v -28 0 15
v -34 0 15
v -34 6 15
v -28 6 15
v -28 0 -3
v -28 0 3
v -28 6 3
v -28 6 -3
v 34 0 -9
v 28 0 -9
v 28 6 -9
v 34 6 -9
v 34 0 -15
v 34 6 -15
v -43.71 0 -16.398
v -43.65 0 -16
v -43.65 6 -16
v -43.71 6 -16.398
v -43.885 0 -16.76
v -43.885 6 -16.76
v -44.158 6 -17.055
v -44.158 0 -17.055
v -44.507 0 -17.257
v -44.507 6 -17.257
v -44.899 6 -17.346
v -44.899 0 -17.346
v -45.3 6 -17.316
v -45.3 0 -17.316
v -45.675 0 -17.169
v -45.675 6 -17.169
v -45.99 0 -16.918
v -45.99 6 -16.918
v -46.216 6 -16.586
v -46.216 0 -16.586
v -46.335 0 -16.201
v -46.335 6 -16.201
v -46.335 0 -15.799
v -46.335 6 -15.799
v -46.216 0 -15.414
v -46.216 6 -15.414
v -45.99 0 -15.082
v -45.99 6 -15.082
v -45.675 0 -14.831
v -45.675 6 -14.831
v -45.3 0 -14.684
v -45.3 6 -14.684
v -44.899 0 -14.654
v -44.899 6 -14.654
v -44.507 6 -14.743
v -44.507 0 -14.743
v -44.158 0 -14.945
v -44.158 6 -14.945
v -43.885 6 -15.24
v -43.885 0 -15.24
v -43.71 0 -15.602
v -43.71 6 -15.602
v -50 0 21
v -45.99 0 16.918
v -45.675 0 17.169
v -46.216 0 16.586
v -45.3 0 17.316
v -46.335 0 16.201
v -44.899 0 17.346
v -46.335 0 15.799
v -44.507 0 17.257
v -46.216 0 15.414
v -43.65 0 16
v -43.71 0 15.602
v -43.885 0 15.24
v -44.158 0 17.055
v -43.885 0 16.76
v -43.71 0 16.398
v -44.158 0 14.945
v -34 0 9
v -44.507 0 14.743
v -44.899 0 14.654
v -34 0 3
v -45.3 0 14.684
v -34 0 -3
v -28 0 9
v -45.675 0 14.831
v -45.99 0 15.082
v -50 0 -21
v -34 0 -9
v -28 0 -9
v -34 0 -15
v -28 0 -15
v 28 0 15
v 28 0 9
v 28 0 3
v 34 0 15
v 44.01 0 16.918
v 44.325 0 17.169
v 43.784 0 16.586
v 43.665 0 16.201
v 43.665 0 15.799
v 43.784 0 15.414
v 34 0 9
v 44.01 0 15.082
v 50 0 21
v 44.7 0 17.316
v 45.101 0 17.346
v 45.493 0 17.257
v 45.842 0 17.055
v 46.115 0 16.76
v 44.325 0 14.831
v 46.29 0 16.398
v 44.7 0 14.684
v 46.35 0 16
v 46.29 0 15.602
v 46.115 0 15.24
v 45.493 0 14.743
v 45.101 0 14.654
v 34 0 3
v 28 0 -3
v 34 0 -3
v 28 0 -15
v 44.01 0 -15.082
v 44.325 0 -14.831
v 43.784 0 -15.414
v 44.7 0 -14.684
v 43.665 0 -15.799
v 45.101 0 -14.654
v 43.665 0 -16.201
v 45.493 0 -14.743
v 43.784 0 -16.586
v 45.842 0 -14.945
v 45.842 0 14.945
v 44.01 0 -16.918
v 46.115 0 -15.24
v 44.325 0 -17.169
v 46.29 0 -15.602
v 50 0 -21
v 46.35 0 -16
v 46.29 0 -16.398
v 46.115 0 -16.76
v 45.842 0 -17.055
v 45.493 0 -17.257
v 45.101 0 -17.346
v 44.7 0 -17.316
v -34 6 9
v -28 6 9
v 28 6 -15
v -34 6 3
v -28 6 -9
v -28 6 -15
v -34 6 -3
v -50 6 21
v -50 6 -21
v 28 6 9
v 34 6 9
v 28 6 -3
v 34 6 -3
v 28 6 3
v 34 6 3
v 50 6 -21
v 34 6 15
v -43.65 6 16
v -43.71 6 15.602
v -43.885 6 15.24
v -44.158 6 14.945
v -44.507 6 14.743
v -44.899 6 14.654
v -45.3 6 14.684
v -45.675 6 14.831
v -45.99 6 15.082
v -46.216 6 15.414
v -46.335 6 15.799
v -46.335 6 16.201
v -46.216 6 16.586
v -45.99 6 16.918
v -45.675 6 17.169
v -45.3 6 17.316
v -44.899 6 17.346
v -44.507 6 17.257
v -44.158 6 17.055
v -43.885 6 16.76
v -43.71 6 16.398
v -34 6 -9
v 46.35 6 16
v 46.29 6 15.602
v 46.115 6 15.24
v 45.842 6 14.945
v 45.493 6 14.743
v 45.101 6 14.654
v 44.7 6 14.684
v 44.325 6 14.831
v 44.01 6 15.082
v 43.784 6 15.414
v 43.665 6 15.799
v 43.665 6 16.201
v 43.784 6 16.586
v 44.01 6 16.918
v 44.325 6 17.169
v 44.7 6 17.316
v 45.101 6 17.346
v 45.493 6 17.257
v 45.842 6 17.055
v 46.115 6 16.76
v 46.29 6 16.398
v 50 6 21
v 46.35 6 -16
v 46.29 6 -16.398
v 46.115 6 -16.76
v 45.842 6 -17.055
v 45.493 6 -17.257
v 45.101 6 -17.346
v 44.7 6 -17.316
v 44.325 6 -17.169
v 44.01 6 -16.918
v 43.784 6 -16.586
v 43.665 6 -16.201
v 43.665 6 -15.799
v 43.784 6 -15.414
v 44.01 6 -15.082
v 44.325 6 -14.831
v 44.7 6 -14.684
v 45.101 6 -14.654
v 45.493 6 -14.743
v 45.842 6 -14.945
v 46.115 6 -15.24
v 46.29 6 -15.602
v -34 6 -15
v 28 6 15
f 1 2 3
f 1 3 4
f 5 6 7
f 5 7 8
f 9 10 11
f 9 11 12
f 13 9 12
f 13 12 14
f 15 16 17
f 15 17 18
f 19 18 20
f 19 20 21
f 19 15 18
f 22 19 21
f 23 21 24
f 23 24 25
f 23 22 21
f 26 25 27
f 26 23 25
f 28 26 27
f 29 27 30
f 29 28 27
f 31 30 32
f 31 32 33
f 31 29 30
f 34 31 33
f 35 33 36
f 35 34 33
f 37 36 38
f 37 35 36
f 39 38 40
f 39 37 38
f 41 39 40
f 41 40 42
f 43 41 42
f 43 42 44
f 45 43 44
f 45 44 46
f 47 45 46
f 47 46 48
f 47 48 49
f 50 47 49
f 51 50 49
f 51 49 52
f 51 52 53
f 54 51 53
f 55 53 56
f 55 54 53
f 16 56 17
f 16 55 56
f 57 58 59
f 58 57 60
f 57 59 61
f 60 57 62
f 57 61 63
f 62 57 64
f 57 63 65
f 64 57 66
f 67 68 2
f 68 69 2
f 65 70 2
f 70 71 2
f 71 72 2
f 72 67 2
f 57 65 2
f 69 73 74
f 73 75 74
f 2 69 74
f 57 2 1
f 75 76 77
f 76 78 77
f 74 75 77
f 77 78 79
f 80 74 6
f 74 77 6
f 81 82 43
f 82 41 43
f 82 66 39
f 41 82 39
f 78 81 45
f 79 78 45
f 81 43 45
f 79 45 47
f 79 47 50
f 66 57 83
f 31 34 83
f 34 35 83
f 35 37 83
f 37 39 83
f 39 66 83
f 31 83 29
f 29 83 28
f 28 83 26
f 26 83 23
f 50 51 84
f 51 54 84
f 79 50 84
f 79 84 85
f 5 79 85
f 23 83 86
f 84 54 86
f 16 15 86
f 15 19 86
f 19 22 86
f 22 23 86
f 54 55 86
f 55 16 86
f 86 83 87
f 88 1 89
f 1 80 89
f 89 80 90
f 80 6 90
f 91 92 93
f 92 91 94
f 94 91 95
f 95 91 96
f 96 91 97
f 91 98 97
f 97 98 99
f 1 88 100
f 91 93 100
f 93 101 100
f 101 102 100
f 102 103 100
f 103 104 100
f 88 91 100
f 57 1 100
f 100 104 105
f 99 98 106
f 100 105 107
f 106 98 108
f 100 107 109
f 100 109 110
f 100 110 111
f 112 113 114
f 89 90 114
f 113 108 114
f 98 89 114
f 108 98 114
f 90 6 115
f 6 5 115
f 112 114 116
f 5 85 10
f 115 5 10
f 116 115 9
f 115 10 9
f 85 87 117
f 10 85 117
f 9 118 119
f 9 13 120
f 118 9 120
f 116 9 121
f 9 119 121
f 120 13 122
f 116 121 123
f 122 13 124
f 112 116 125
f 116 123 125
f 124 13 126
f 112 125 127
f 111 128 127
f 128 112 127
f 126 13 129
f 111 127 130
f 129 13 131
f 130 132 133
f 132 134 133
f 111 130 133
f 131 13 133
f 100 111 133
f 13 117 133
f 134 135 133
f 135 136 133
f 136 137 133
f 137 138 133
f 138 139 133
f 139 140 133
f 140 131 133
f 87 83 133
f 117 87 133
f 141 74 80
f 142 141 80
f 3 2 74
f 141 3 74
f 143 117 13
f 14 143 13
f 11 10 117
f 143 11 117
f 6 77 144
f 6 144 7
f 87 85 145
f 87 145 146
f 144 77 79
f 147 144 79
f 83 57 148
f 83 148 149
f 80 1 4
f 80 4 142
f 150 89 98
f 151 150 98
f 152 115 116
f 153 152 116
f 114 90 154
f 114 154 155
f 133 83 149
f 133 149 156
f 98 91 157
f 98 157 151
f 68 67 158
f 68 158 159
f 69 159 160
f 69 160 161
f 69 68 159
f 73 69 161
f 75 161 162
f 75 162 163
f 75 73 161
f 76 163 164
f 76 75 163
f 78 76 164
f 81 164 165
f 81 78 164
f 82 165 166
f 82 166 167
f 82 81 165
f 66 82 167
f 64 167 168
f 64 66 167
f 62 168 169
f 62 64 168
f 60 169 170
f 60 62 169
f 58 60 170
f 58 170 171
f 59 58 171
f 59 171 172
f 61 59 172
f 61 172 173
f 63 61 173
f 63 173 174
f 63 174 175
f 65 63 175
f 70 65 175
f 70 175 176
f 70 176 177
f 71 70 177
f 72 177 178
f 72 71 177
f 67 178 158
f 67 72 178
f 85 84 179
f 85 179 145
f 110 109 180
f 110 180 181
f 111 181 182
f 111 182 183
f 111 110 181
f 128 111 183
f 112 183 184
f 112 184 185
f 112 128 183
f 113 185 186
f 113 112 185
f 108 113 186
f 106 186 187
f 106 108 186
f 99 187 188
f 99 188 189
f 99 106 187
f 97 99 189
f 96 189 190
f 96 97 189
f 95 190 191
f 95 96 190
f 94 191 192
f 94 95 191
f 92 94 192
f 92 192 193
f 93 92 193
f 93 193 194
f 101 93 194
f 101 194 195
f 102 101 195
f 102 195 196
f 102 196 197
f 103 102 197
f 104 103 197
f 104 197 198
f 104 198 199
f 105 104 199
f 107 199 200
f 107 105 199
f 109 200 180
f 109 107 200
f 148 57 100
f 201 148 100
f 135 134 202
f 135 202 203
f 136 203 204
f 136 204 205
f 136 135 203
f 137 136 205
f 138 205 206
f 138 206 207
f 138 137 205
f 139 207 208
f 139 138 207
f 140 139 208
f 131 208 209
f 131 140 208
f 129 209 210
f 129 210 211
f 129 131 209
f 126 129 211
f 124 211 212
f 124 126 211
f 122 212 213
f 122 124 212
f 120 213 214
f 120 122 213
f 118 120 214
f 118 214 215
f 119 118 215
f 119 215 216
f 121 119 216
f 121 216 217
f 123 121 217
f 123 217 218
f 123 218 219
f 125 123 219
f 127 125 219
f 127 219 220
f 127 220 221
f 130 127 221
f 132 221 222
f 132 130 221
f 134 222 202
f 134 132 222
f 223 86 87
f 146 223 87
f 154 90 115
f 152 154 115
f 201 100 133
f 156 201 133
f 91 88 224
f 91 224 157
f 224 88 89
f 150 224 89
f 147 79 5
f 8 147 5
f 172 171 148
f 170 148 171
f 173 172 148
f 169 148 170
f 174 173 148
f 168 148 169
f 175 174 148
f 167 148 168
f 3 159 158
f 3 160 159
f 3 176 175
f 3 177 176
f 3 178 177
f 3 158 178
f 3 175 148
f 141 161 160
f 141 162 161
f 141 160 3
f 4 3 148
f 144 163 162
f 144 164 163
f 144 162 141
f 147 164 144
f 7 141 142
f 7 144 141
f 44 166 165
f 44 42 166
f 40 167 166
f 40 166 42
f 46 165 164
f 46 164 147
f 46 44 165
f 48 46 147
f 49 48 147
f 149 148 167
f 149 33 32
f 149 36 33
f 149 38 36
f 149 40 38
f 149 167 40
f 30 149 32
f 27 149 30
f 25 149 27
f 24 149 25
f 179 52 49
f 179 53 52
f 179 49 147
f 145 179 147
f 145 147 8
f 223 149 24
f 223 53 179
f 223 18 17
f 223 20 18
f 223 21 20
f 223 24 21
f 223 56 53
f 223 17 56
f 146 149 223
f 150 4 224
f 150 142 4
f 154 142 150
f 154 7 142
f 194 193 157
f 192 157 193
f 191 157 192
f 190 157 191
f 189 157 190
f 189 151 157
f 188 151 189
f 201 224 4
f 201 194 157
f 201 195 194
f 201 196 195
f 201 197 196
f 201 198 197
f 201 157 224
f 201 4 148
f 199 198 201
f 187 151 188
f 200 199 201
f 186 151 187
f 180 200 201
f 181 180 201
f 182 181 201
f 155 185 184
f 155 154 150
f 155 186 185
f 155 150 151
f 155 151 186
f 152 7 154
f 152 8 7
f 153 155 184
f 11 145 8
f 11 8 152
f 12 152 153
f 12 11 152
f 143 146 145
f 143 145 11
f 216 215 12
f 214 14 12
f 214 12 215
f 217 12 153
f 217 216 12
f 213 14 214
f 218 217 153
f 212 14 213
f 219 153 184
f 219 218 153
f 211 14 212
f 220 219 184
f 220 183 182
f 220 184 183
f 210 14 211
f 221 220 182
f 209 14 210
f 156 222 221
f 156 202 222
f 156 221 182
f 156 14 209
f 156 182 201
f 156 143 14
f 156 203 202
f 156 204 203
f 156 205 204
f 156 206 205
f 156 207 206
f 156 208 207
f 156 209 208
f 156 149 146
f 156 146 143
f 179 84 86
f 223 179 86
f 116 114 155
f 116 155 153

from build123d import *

# Parameters (mm, degrees)
SKETCH2_W           = 100
SKETCH2_H           = 42
SKETCH2_R           = 1.35
SKETCH2_W_2         = 6
SKETCH2_H_2         = 6
BOSS_EXTRUDE1_DEPTH = 6


with BuildPart() as part:
    # Sketch2 → Boss-Extrude1 (new body)
    with BuildSketch(Plane(origin=(0, 0, 0), x_dir=(1, 0, 0), z_dir=(0, 1, 0))):
        Rectangle(SKETCH2_W, SKETCH2_H)
        with Locations((-45, -16)):
            Circle(SKETCH2_R, mode=Mode.SUBTRACT)
        with Locations((-45, 16)):
            Circle(SKETCH2_R, mode=Mode.SUBTRACT)
        with Locations((45, 16)):
            Circle(SKETCH2_R, mode=Mode.SUBTRACT)
        with Locations((45, -16)):
            Circle(SKETCH2_R, mode=Mode.SUBTRACT)
        with Locations((-31, -12)):
            Rectangle(SKETCH2_W_2, SKETCH2_H_2, mode=Mode.SUBTRACT)
        with Locations((-31, 0)):
            Rectangle(SKETCH2_W_2, SKETCH2_H_2, mode=Mode.SUBTRACT)
        with Locations((-31, 12)):
            Rectangle(SKETCH2_W_2, SKETCH2_H_2, mode=Mode.SUBTRACT)
        with Locations((31, -12)):
            Rectangle(SKETCH2_W_2, SKETCH2_H_2, mode=Mode.SUBTRACT)
        with Locations((31, 0)):
            Rectangle(SKETCH2_W_2, SKETCH2_H_2, mode=Mode.SUBTRACT)
        with Locations((31, 12)):
            Rectangle(SKETCH2_W_2, SKETCH2_H_2, mode=Mode.SUBTRACT)
    extrude(amount=BOSS_EXTRUDE1_DEPTH)


solid = part.part
